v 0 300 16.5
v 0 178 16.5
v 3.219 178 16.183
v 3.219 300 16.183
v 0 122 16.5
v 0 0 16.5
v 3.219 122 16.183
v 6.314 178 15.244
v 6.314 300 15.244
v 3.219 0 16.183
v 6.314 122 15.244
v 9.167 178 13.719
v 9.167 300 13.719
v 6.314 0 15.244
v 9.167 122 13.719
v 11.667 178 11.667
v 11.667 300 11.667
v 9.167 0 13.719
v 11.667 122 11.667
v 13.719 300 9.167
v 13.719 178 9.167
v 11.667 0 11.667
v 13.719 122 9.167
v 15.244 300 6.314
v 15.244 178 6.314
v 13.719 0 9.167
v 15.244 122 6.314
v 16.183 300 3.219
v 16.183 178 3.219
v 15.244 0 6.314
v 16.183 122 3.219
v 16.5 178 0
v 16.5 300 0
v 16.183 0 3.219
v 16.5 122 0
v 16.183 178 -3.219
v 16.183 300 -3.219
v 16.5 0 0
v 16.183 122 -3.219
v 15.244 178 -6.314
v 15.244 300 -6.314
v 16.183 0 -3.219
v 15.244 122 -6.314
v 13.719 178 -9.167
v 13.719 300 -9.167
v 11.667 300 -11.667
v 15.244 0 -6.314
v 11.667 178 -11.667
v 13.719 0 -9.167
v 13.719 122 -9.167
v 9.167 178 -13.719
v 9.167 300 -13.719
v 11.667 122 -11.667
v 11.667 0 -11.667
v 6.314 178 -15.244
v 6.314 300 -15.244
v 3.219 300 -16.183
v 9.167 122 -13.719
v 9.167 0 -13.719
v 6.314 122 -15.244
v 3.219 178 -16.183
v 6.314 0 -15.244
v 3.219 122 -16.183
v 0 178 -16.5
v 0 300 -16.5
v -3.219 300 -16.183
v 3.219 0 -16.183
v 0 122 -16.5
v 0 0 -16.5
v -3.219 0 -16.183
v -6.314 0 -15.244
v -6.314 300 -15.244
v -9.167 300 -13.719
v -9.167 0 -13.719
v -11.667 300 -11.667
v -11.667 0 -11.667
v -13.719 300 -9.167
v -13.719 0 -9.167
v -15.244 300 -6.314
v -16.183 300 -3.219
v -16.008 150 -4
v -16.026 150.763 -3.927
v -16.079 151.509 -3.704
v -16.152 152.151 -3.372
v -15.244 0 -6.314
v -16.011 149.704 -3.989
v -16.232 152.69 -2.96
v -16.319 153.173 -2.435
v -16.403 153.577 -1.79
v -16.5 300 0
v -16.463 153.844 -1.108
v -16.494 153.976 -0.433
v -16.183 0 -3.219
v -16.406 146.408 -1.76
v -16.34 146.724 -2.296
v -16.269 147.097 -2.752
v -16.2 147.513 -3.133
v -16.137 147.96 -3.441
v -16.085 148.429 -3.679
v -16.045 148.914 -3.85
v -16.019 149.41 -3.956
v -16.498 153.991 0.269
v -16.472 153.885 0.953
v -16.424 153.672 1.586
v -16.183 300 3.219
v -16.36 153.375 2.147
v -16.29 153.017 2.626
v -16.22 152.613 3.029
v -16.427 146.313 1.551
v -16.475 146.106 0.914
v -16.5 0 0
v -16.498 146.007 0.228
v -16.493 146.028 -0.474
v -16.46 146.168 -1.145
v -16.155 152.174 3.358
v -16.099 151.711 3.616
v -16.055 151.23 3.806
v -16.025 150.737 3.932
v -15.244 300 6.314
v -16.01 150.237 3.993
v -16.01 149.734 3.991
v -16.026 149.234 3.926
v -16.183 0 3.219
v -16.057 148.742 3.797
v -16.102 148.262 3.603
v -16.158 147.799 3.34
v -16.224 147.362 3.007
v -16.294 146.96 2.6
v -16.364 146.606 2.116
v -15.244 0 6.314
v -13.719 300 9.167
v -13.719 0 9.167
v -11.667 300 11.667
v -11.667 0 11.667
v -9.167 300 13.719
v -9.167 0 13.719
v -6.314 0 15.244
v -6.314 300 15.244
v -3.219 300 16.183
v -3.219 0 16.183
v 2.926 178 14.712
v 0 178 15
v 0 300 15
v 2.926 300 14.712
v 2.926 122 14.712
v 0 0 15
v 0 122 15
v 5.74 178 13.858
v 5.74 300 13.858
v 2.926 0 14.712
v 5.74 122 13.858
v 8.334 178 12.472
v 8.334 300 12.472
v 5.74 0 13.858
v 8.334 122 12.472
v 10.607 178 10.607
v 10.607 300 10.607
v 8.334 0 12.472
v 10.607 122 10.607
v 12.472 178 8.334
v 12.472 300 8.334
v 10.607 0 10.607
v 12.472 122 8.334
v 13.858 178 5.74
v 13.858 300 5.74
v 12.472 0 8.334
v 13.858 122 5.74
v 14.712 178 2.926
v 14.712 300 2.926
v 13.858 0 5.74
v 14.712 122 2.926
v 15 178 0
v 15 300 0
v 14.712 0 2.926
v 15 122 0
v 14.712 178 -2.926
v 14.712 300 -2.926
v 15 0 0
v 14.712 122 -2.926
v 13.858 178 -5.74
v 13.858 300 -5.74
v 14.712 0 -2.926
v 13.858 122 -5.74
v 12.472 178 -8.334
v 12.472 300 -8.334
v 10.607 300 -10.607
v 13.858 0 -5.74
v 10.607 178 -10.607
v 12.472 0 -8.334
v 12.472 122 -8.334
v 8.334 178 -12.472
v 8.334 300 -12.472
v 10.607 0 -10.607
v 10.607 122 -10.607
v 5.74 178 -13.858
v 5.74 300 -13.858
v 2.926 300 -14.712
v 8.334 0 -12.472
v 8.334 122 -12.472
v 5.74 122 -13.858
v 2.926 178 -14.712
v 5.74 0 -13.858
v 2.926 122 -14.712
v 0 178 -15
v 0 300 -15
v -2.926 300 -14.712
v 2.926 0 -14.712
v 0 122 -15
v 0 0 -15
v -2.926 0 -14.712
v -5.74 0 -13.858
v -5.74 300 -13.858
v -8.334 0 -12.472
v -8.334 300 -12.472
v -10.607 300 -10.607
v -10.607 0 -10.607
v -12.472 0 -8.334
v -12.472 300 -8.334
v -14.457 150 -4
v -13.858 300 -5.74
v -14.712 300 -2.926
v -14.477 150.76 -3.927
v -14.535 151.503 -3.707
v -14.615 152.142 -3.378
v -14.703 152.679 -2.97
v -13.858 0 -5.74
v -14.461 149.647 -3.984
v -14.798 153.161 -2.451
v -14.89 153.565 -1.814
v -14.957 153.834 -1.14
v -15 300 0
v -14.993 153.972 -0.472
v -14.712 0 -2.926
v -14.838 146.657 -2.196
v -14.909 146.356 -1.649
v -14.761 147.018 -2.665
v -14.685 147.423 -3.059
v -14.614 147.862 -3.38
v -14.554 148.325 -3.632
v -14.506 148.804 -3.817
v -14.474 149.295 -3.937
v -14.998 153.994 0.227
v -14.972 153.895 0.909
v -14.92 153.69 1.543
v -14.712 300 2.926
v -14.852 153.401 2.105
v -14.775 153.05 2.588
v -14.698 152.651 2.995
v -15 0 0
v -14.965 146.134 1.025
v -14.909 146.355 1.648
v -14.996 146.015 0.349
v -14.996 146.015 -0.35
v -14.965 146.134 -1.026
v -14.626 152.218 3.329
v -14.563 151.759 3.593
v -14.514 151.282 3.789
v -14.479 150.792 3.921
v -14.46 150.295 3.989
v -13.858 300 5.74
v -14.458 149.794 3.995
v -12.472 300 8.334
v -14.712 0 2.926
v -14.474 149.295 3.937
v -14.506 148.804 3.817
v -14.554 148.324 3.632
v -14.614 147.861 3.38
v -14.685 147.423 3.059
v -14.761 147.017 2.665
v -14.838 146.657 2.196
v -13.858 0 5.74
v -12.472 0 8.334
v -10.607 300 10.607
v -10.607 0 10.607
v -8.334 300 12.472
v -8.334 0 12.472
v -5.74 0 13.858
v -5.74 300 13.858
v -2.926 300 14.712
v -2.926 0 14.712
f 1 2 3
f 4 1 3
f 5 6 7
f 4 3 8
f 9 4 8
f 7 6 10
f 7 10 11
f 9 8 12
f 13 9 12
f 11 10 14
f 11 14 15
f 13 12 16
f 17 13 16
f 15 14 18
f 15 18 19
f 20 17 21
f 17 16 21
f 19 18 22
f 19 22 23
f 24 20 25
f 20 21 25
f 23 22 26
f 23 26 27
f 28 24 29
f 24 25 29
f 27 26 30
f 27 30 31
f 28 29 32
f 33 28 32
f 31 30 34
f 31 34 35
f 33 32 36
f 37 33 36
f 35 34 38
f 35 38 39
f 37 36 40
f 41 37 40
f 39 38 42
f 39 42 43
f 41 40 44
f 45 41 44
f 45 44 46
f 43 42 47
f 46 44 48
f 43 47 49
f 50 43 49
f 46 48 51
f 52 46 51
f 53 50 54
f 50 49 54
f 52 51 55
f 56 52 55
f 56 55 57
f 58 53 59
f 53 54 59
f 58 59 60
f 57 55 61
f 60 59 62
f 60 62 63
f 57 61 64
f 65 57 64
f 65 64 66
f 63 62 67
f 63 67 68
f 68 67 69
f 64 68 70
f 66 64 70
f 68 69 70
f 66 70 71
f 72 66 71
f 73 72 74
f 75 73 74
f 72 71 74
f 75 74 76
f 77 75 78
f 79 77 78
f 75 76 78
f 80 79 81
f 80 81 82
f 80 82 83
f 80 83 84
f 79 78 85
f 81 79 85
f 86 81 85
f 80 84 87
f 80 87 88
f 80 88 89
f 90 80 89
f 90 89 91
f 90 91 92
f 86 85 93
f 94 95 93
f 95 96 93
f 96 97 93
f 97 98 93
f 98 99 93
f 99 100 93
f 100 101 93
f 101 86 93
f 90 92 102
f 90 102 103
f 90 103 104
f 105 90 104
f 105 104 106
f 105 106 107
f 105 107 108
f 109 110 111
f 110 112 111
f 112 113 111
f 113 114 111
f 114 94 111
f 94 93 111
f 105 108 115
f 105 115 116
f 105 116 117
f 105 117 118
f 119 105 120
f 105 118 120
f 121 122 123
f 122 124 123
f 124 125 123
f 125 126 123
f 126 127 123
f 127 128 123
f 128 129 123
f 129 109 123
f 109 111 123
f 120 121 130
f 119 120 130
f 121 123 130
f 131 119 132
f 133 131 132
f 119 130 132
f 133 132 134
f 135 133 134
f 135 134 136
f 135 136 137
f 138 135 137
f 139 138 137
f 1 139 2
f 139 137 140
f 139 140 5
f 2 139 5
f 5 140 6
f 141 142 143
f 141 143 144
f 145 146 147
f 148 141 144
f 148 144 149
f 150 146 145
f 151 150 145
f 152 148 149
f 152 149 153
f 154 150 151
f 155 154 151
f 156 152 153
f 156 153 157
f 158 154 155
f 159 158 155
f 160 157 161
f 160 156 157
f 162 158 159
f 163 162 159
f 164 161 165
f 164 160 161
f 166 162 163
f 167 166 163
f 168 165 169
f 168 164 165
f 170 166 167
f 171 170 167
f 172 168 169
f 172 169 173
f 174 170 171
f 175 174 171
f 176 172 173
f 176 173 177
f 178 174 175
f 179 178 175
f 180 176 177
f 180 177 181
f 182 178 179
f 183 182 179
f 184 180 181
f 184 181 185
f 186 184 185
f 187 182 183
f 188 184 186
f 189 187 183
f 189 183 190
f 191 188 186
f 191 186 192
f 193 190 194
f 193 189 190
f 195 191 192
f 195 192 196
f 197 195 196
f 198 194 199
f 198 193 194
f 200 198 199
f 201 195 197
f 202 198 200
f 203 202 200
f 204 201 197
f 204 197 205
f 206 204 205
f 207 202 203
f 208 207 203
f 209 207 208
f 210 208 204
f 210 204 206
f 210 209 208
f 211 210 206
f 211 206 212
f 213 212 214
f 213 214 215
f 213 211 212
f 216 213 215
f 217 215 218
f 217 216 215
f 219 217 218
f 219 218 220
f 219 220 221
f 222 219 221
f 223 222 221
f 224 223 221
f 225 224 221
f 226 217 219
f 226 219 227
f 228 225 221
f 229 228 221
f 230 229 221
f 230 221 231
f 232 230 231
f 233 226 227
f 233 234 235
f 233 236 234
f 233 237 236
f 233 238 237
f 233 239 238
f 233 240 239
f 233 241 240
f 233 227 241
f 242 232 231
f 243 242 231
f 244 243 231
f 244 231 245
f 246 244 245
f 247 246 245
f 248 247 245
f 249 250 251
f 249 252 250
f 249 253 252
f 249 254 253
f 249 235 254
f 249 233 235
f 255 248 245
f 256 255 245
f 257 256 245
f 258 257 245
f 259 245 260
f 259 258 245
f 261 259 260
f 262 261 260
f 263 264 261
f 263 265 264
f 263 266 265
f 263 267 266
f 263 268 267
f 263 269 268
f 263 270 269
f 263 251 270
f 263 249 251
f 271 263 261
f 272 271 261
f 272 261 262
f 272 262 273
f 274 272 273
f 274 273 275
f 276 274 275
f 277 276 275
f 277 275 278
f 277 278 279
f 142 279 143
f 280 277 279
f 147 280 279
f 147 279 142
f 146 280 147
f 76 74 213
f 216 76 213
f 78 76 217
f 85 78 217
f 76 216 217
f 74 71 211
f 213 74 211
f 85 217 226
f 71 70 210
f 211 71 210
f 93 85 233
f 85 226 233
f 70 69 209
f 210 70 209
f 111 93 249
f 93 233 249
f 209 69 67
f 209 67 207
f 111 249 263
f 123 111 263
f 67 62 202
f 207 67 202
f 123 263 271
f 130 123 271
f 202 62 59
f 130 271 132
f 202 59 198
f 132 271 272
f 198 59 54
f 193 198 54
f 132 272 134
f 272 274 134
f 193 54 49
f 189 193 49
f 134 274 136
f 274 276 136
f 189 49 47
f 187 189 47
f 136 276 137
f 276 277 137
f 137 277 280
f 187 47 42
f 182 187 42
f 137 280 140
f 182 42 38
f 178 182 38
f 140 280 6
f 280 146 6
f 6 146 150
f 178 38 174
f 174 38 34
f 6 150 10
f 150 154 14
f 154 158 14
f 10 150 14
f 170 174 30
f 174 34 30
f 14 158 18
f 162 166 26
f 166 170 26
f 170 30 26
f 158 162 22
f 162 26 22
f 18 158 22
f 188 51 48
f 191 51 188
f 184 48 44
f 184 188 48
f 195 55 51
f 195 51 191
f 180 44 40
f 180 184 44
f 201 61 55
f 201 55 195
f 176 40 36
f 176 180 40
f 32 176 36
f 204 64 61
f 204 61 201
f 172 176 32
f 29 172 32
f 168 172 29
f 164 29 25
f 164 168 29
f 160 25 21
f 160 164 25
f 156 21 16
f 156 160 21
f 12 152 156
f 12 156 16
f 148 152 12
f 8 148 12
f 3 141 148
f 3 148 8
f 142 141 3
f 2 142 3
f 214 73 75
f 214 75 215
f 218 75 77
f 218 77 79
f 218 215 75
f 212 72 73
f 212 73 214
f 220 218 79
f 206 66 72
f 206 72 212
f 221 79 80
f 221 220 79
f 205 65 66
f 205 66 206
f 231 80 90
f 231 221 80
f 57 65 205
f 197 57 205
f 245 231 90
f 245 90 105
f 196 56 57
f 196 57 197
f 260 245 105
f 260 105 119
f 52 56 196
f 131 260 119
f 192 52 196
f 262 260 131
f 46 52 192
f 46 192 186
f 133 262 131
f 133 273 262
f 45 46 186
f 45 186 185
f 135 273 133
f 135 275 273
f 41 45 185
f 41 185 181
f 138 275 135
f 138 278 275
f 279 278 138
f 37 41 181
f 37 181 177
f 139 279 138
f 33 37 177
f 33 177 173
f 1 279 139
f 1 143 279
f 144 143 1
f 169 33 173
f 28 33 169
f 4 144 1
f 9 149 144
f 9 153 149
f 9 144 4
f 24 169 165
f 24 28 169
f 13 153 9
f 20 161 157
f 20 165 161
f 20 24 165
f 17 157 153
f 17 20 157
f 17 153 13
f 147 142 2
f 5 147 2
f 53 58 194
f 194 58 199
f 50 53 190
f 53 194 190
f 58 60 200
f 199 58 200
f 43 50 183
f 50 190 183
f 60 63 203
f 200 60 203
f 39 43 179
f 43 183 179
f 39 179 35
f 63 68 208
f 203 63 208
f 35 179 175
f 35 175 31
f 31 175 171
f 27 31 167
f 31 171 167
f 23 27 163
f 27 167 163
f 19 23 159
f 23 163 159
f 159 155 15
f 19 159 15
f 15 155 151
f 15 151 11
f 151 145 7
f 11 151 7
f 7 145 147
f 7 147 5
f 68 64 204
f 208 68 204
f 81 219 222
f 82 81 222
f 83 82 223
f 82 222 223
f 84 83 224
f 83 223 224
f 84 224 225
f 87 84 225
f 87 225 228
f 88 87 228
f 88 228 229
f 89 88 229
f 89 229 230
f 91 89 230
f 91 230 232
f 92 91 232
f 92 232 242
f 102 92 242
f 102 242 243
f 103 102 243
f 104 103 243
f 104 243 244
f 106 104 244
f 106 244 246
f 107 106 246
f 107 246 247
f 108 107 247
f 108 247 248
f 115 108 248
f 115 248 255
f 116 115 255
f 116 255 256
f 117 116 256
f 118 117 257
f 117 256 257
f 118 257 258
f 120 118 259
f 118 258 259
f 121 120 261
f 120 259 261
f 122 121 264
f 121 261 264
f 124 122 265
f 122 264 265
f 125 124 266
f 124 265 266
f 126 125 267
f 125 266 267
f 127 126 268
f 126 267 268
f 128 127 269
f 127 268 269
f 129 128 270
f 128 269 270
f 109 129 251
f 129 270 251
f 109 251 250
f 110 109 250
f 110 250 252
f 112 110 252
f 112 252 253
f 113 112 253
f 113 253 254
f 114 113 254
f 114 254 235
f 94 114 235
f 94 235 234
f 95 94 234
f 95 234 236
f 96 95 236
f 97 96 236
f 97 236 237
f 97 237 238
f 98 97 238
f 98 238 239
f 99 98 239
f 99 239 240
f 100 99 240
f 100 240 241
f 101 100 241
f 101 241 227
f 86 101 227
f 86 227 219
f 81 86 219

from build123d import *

# Parameters (mm, degrees)
SKETCH2_R           = 16.5
SKETCH2_R_2         = 15
BOSS_EXTRUDE1_DEPTH = 300
CUT_EXTRUDE1_DEPTH  = 28
SKETCH4_R           = 4
CUT_EXTRUDE2_DEPTH  = 30


with BuildPart() as part:
    # Sketch2 → Boss-Extrude1 (new body)
    with BuildSketch(Plane(origin=(0, 0, 0), x_dir=(1, 0, 0), z_dir=(0, 1, 0))):
        with Locations(Location((0, 0, 0), (0, 0, 270))):
            Circle(SKETCH2_R)
        with Locations(Location((0, 0, 0), (0, 0, 270))):
            Circle(SKETCH2_R_2, mode=Mode.SUBTRACT)
    extrude(amount=BOSS_EXTRUDE1_DEPTH)

    # Sketch3 → Cut-Extrude1 (cut)
    with BuildSketch(Plane(origin=(0, 0, 0), x_dir=(0, 0, -1), z_dir=(1, 0, 0))):
        Polygon((21.27756657, 178), (21.27756657, 122), (-16.5, 122), (-16.5, 150), (-16.5, 178), (-14, 178), align=None)
    extrude(amount=CUT_EXTRUDE1_DEPTH, mode=Mode.SUBTRACT)

    # Sketch4 → Cut-Extrude2 (cut)
    with BuildSketch(Plane(origin=(0, 0, 0), x_dir=(0, 0, -1), z_dir=(1, 0, 0))):
        with Locations((0, 150)):
            Circle(SKETCH4_R)
    extrude(amount=-CUT_EXTRUDE2_DEPTH, mode=Mode.SUBTRACT)


solid = part.part
